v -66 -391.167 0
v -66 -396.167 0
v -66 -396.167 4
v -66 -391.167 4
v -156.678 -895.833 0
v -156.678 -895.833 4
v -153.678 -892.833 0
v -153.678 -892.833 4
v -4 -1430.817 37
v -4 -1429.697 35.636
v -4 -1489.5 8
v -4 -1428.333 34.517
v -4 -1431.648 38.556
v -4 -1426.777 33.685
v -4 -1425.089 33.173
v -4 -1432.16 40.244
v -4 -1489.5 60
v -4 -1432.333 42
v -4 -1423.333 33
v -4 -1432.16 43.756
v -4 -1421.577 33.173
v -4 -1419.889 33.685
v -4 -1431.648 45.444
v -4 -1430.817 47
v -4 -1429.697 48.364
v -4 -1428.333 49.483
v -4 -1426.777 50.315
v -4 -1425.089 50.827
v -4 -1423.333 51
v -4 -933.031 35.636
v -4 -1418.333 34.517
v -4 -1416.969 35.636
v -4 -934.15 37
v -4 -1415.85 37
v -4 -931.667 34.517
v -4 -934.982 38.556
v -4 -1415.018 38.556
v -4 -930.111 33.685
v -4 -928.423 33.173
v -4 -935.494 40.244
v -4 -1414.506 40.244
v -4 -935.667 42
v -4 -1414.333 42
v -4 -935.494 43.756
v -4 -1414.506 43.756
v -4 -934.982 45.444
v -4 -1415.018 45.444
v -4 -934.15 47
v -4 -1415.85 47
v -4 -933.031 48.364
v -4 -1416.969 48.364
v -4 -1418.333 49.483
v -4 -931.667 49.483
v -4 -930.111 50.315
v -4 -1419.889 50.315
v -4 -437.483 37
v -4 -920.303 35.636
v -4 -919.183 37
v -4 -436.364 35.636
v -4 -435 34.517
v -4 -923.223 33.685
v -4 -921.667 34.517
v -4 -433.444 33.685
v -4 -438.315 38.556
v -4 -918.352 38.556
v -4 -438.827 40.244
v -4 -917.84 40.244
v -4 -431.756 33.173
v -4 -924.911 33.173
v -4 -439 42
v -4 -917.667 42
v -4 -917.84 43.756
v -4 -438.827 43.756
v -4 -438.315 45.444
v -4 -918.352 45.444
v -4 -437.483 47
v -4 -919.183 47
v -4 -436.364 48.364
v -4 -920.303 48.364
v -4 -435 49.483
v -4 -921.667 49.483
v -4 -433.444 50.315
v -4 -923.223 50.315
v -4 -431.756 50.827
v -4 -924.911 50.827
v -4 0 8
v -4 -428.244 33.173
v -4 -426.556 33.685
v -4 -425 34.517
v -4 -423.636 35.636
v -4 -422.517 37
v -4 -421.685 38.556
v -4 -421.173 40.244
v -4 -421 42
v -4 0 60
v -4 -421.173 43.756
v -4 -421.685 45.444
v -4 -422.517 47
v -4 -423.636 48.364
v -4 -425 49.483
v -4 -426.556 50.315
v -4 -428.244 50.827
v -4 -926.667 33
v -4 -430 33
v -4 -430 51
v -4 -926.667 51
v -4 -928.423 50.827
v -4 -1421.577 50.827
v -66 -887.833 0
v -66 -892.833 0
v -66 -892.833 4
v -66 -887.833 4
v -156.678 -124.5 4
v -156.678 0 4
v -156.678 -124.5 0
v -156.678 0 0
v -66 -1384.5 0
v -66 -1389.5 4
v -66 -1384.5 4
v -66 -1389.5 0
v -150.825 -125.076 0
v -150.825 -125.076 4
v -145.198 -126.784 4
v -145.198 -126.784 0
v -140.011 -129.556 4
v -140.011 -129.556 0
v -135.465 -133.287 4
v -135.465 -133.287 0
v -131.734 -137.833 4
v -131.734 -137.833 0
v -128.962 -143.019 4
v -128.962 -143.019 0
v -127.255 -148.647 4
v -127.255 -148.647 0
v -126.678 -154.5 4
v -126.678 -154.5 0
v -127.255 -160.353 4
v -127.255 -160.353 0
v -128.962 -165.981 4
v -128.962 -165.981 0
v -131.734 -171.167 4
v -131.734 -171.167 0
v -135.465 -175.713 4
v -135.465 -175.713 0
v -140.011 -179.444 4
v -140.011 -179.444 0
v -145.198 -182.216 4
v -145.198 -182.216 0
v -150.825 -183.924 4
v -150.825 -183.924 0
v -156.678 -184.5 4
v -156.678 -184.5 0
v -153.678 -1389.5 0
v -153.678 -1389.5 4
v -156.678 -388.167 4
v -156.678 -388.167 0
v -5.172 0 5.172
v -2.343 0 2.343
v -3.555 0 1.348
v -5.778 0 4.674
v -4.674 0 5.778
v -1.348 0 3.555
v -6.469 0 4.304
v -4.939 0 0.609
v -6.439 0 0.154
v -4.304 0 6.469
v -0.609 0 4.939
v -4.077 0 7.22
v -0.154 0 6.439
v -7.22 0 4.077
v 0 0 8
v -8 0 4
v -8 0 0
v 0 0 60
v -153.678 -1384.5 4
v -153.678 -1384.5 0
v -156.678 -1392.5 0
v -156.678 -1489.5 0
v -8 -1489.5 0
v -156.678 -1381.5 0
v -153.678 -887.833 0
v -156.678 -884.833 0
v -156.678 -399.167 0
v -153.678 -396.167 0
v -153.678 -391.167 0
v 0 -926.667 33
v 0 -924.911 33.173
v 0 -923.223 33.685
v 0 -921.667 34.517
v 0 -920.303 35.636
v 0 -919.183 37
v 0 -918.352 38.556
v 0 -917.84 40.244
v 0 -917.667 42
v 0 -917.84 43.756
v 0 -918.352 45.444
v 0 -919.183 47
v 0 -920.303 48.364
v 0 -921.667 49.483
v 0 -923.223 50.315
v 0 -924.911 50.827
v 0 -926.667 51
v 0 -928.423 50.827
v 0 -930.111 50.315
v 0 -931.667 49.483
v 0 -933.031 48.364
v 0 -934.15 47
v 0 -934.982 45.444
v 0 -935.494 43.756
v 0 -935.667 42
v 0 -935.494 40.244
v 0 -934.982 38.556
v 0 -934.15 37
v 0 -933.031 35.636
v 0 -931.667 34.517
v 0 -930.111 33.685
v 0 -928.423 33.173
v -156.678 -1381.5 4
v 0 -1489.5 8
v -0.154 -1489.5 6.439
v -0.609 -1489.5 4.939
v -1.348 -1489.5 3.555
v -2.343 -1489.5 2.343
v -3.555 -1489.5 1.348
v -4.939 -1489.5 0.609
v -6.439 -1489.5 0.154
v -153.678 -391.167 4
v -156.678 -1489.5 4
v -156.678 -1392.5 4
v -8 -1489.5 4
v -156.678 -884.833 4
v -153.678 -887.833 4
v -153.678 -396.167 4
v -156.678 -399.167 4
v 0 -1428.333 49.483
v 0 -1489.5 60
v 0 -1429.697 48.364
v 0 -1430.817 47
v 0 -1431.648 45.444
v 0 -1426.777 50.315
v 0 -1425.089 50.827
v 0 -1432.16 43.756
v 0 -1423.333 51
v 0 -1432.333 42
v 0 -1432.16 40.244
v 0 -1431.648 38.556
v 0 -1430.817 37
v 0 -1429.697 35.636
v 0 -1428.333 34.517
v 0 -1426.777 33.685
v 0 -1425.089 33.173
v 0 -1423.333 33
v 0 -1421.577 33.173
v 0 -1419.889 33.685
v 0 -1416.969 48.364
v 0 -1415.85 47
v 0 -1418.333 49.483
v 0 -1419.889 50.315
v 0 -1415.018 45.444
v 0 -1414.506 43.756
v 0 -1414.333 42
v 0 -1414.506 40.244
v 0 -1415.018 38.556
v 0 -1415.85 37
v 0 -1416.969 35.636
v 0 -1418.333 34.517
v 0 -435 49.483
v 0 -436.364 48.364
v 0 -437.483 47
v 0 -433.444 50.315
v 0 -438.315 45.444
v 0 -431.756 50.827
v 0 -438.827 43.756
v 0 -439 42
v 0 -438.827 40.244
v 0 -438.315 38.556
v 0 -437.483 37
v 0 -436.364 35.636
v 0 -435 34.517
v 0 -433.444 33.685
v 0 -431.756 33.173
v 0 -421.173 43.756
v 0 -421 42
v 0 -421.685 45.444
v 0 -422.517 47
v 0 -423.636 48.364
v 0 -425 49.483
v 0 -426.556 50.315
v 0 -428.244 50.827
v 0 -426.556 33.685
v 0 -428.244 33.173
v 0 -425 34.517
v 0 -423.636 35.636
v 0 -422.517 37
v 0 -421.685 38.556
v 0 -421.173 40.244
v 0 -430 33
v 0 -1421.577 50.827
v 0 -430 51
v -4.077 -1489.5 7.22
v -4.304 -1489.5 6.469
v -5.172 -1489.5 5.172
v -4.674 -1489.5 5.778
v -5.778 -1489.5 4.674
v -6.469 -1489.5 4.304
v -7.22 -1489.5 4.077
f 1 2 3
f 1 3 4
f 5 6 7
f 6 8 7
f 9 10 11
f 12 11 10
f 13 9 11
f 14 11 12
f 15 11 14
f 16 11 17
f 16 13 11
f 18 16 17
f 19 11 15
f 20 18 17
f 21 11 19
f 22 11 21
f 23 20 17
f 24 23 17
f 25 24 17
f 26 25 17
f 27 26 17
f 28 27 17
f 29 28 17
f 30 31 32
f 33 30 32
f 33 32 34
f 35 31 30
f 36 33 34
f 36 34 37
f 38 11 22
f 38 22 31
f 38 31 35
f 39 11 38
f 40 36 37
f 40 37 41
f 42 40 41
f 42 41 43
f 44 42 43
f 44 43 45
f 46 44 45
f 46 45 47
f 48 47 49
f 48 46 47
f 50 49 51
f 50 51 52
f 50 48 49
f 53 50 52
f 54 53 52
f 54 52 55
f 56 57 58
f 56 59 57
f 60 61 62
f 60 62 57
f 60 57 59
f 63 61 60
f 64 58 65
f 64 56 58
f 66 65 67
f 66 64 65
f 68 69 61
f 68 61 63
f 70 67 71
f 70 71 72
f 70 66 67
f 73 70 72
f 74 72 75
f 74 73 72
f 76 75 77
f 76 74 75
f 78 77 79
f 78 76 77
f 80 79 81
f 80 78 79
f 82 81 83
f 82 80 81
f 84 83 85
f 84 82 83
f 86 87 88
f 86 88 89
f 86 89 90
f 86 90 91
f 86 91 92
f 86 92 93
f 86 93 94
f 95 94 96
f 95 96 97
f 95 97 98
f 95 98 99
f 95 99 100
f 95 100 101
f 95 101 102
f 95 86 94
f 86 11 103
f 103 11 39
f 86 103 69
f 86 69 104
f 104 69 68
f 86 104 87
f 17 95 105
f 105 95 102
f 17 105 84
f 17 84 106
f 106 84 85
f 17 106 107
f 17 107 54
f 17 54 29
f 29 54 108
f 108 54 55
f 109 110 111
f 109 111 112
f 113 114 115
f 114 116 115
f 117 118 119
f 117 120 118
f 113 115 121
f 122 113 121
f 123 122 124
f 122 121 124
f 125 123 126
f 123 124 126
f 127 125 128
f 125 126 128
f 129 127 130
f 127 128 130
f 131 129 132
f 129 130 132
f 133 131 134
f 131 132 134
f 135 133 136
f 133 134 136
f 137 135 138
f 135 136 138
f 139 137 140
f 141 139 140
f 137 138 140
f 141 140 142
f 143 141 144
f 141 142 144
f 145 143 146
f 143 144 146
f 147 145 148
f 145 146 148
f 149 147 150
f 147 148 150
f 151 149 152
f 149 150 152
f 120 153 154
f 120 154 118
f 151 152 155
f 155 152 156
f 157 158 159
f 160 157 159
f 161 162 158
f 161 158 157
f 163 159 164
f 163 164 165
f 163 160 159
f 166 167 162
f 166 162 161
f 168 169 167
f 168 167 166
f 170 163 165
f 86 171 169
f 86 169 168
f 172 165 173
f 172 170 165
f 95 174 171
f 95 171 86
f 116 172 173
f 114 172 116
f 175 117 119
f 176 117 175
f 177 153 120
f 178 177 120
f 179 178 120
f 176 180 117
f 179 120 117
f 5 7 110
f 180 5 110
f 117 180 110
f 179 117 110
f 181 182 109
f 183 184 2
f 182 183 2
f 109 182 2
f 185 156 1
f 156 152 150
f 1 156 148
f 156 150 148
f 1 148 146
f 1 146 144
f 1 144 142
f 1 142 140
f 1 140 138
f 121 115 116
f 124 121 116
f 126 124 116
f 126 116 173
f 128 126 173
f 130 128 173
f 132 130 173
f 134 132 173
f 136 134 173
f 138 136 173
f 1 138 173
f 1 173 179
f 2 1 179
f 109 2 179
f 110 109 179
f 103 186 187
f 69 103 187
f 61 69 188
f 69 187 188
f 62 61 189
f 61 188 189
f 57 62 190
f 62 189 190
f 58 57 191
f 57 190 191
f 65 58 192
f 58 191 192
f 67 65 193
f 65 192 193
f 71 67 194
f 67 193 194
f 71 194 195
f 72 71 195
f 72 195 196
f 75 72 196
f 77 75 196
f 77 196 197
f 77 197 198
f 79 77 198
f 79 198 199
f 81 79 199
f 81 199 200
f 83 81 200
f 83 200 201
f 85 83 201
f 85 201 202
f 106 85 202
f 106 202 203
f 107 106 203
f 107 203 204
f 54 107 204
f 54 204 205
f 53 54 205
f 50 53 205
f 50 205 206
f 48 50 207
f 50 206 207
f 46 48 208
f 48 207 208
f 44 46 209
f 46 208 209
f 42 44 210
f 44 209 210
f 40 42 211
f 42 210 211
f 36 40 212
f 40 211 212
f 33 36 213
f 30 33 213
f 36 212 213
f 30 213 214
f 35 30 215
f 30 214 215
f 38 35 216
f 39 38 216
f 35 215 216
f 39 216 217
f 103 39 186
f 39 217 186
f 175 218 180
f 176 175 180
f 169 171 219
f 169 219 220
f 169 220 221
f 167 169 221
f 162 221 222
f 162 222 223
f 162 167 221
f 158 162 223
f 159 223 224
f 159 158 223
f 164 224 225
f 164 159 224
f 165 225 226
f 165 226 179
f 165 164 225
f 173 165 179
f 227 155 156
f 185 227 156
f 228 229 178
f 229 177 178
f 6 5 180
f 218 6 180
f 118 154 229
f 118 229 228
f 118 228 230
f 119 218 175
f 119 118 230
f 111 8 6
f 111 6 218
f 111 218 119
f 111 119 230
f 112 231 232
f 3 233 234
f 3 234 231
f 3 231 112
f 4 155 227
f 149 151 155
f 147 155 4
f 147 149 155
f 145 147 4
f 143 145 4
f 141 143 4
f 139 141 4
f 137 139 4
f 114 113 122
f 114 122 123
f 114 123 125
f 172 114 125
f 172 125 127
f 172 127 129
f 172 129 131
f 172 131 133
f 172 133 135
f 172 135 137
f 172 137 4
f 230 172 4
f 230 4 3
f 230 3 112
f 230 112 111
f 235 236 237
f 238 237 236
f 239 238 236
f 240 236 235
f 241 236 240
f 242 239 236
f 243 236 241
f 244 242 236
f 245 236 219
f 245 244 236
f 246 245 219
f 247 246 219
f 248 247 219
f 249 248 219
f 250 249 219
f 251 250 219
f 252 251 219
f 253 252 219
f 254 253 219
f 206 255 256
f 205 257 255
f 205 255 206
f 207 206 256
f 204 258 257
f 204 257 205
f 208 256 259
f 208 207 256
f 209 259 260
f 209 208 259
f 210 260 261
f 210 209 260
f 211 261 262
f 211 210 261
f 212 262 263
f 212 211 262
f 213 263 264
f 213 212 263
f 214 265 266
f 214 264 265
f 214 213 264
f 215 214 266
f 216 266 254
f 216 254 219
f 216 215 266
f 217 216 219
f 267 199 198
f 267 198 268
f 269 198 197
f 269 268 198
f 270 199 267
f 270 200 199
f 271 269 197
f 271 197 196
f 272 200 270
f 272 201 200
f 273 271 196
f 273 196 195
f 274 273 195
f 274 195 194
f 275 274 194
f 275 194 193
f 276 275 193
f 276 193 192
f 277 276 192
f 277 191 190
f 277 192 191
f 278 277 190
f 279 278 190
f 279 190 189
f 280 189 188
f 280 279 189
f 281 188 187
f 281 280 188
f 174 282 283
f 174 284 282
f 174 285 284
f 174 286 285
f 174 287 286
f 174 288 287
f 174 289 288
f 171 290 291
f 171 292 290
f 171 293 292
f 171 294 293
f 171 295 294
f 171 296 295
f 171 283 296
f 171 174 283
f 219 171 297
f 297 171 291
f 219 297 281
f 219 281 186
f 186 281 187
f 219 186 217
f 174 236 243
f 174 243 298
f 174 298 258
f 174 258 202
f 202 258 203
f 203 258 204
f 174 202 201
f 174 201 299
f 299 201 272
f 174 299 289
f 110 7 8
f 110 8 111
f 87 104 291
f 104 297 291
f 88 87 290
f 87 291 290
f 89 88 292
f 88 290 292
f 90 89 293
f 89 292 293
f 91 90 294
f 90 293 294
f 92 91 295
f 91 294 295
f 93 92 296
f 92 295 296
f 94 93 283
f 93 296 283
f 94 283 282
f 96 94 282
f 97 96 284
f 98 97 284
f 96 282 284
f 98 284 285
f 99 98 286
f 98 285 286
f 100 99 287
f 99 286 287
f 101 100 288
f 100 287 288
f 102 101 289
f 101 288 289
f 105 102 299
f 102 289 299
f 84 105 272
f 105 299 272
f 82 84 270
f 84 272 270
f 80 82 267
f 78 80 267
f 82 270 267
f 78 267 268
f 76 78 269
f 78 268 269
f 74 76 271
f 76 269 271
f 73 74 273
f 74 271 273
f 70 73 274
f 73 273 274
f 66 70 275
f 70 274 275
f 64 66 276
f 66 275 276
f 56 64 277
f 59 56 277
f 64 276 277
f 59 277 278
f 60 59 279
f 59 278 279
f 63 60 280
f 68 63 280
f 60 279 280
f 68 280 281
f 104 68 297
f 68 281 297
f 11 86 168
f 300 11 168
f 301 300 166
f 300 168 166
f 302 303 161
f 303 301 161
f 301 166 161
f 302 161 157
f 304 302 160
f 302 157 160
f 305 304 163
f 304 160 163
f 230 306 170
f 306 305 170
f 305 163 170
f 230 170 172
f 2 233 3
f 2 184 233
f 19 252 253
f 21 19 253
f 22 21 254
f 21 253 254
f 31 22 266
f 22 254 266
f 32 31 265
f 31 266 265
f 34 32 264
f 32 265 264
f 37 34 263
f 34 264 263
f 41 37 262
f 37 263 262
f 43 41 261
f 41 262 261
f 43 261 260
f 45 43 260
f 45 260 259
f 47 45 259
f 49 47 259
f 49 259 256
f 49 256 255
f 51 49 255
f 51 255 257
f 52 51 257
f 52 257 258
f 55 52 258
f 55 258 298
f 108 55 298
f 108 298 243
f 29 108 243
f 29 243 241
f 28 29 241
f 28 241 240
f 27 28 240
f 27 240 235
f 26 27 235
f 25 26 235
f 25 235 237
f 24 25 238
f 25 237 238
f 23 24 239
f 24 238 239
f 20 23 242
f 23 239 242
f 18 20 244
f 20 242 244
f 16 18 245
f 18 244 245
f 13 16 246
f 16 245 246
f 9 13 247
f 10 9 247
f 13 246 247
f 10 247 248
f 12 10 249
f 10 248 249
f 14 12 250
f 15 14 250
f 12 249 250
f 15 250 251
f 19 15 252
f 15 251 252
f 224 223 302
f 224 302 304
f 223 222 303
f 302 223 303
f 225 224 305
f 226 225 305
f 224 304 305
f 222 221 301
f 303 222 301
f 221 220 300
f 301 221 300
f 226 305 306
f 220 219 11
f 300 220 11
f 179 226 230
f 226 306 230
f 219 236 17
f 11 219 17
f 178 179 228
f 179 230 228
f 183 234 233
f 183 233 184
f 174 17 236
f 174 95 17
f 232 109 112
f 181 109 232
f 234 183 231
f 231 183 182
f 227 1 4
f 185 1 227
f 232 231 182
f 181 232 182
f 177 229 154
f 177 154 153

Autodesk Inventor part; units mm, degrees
ref_plane "YZ Plane" through (0, 0, 0) normal (1, 0, 0) x (0, 1, 0)
ref_plane "XZ Plane" through (0, 0, 0) normal (0, 1, 0) x (-1, 0, 0)
ref_plane "XY Plane" through (0, 0, 0) normal (0, 0, 1) x (1, 0, 0)
sketch "Sketch1" plane through (0, 0, 0) normal (0, 0, 1) x (1, 0, 0)
  line L0 (0, 0) -> (-156.6782, 0)
  line L1 (-156.6782, 0) -> (-156.6782, -1489.5)
  line L2 (-156.6782, -1489.5) -> (0, -1489.5)
  line L3 (0, -1489.5) -> (0, 0)
  line L4 (-156.6782, -1389.5) -> (-66, -1389.5)
  line L5 (-66, -1389.5) -> (-66, -1384.5)
  line L6 (-66, -1384.5) -> (-156.6782, -1384.5)
  line L7 (-156.6782, -1384.5) -> (-156.6782, -1389.5)
  line L8 (-156.6782, -892.8333) -> (-66, -892.8333)
  line L9 (-66, -892.8333) -> (-66, -887.8333)
  line L10 (-66, -887.8333) -> (-156.6782, -887.8333)
  line L11 (-156.6782, -887.8333) -> (-156.6782, -892.8333)
  line L12 (-156.6782, -396.1667) -> (-66, -396.1667)
  line L13 (-66, -396.1667) -> (-66, -391.1667)
  line L14 (-66, -391.1667) -> (-156.6782, -391.1667)
  line L15 (-156.6782, -391.1667) -> (-156.6782, -396.1667)
  circle A0 centre (-156.6782, -154.5) radius 30
  point P0 (-156.6782, -1384.5)
  point P1 (-156.6782, -124.5)
  point P2 (-156.6782, -184.5)
  dimension "d0" = 1489.5
  dimension "d1" = 156.6782
  dimension "d2" = 5
  dimension "d4" = 100
  dimension "d7" = 496.6667
  dimension "d23" = 66
  dimension "d28" = 60
  dimension "d29" = 1335
extrude "Plate1" add sketch "Sketch1" along normal blind 4 contours L3 L2 L1 L4 L5 L6 L8 L9 L10 L12 L13 L14 A0 L0
sketch "Sketch2" plane through (-4, 0, 0) normal (1, 0, 0) x (0, 1, 0)
  line L0 (-1489.5, 0) -> (0, 0)
  line L1 (0, 0) -> (0, 60)
  line L2 (0, 60) -> (-1489.5, 60)
  line L3 (-1489.5, 60) -> (-1489.5, 0)
edge flange "Flange1" height 60 angle 90 thickness 4 bend radius 4 thickness toward (1, 0, 0) relief tear relief width 4 relief depth 2 edges at (0, -744.75, 4) wall of the first edge with corners at (-4, -1489.5, 0) (-4, 0, 0) (-4, 0, 60) (-4, -1489.5, 60)
bend "Bend1"
corner "Corner1"
chamfer "Corner Chamfer1" distance 3 angle 45 6 edges at (-156.6782, -1389.5, 2) (-156.6782, -1384.5, 2) (-156.6782, -892.8333, 2) (-156.6782, -887.8333, 2) (-156.6782, -391.1667, 2) (-156.6782, -396.1667, 2)
sketch "Sketch4" plane through (0, -1489.5, 60) normal (1, 0, 0) x (0, 0, -1)
  circle A0 centre (18, 1059.5) radius 9
  line L0 (0, 0) -> (0, 1489.5) projected
  circle A1 centre (18, 562.8333) radius 9
  circle A2 centre (18, 66.1667) radius 9
  point P0 (60, 1489.5)
  dimension "d30" = 18
  dimension "d31" = 18
  dimension "d32" = 430
  dimension "d35" = 496.6667
extrude "Cut1" cut sketch "Sketch4" against normal blind 4
equation "\"d0\" = Стрингер_длина"
equation "\"d1\" = стрингер_глубина_4"
equation "\"d2\" = паз_под_стрингер_толщина"
equation "\"d7\" = Шаг_шпангоутов"
equation "\"d23\" = паз_под_стрингер_глубина - Thickness"
equation "\"d28\" = 2 * радиус_выреза_под_сварку"
equation "\"d35\" = Шаг_шпангоутов"
equation "\"d40\" = Thickness"
equation "\"d12\" = Thickness"
equation "\"d13\" = BendReliefWidth"
equation "\"d14\" = BendReliefDepth"
equation "\"d15\" = MinimumRemnant"
equation "\"d16\" = TransitionRadius"
equation "\"d17\" = ребро_усилителей"
equation "\"d19\" = BendRadius"
equation "\"d20\" = CornerReliefSize"
equation "\"d21\" = GapSize"
equation "\"d22\" = JacobiRadiusSize"
equation "\"BendRadius\" = Thickness"
equation "\"BendReliefWidth\" = Thickness"
equation "\"BendReliefDepth\" = 0.5 * Thickness"
equation "\"CornerReliefSize\" = 4 * Thickness"
equation "\"MinimumRemnant\" = 2 * Thickness"
equation "\"TransitionRadius\" = BendRadius"
equation "\"JacobiRadiusSize\" = BendRadius"
equation "\"GapSize\" = Thickness"
equation "\"Стрингер_длина\" = 1489.5"
equation "\"стрингер_глубина_4\" = 156.678203"
equation "\"паз_под_стрингер_толщина\" = 5"
equation "\"Шаг_шпангоутов\" = 496.666667"
equation "\"паз_под_стрингер_глубина\" = 70"
equation "\"Thickness\" = 4"
equation "\"радиус_выреза_под_сварку\" = 30"
equation "\"ребро_усилителей\" = 60"
properties part number "GBK 0202 stringer 4" material "Steel"
